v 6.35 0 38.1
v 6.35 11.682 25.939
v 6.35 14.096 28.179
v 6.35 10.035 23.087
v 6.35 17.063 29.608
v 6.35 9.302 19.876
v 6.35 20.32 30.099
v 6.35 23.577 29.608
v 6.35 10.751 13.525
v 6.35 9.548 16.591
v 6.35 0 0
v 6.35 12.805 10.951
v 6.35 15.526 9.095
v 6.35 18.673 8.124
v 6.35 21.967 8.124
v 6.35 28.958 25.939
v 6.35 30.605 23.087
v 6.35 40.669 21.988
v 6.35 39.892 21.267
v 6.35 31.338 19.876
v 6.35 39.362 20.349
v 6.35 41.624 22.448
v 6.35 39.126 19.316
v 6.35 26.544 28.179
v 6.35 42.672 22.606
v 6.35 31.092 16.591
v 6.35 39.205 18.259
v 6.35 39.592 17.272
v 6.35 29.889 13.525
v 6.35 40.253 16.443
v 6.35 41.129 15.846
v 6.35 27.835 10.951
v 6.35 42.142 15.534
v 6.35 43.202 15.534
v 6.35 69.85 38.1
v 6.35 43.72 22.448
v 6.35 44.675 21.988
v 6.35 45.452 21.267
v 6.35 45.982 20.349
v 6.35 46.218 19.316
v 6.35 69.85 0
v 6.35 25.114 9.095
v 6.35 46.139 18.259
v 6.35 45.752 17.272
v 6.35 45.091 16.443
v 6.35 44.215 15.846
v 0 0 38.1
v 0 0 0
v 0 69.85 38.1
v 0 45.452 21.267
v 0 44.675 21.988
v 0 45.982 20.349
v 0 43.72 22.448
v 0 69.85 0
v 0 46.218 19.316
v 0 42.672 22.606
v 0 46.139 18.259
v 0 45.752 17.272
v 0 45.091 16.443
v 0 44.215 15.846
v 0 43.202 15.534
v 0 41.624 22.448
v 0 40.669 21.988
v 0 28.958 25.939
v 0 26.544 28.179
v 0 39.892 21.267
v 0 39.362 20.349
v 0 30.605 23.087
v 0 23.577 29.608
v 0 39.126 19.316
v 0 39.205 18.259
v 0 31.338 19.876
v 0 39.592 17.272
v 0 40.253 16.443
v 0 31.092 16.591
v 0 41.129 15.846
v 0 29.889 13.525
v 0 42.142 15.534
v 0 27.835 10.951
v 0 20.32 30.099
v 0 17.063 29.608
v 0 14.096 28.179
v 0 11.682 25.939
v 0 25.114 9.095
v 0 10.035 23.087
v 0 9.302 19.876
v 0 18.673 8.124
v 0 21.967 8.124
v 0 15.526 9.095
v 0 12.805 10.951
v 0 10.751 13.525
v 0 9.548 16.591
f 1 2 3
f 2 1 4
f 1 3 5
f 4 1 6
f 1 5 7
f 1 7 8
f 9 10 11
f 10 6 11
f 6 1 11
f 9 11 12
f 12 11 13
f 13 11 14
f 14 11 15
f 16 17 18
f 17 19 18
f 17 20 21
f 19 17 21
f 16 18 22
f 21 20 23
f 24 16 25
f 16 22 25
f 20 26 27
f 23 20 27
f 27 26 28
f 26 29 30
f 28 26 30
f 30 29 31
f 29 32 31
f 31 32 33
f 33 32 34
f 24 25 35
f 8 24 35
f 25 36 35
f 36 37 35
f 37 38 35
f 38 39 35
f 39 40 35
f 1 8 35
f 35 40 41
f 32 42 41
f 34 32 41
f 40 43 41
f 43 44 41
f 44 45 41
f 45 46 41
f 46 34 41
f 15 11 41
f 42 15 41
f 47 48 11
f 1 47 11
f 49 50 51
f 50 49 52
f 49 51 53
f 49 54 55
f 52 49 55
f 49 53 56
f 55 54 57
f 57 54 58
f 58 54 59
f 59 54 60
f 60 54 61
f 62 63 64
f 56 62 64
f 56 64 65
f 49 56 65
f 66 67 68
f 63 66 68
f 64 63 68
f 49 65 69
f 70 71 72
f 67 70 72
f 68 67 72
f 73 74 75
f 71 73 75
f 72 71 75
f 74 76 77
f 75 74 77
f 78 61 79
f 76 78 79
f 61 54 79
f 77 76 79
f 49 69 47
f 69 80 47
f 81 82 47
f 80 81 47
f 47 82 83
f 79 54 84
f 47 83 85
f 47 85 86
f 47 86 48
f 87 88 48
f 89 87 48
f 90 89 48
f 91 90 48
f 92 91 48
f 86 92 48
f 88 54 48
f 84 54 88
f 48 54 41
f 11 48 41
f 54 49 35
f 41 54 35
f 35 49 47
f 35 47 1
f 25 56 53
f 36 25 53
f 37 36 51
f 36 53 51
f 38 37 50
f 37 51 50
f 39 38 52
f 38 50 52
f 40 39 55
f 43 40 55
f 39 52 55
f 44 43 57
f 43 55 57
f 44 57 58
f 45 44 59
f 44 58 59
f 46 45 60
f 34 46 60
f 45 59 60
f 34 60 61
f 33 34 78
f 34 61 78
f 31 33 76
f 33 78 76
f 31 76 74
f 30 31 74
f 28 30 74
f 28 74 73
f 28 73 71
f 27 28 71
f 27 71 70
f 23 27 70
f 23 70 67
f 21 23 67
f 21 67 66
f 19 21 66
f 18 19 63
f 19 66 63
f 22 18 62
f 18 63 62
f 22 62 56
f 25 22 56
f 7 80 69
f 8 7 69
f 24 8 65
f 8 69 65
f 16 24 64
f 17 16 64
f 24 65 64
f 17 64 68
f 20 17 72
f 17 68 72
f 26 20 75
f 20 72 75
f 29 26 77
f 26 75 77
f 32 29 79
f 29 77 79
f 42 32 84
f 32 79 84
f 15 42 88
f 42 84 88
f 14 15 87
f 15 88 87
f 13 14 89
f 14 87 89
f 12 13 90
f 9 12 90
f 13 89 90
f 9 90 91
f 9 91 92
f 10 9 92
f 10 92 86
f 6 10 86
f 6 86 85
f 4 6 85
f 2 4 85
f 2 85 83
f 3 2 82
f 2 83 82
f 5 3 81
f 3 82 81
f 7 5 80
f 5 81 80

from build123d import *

# Parameters (mm, degrees)
BOSS_EXTRUDE1_DEPTH = 38.1
SKETCH2_R           = 11.049
CUT_EXTRUDE1_DEPTH  = 6.35
SKETCH2_4_R         = 3.556
CUT_EXTRUDE2_DEPTH  = 6.35
SKETCH4_W           = 94.447991824
SKETCH4_H           = 31.75
CUT_EXTRUDE5_DEPTH  = 76.2


with BuildPart() as part:
    # Sketch1 → Boss-Extrude1 (new body)
    with BuildSketch(Plane.XY):
        Polygon((0, 76.2), (0, 0), (6.35, 0), (6.35, 69.85), (94.447991824, 69.85), (94.447991824, 101.6), (88.097991824, 101.6), (88.097991824, 76.2), align=None)
    extrude(amount=BOSS_EXTRUDE1_DEPTH)

    # Sketch2 → Cut-Extrude1 (cut)
    with BuildSketch(Plane.ZY):
        with Locations((19.05, 20.32)):
            Circle(SKETCH2_R)
    extrude(amount=-CUT_EXTRUDE1_DEPTH, mode=Mode.SUBTRACT)

    # Sketch2<4> → Cut-Extrude2 (cut)
    with BuildSketch(Plane.ZY):
        with Locations((19.05, 42.672)):
            Circle(SKETCH2_4_R)
    extrude(amount=-CUT_EXTRUDE2_DEPTH, mode=Mode.SUBTRACT)

    # Sketch4 → Cut-Extrude5 (cut)
    with BuildSketch(Plane.XY.offset(38.1)):
        with Locations((47.223995912, 85.725)):
            Rectangle(SKETCH4_W, SKETCH4_H)
    extrude(amount=-CUT_EXTRUDE5_DEPTH, mode=Mode.SUBTRACT)


solid = part.part
